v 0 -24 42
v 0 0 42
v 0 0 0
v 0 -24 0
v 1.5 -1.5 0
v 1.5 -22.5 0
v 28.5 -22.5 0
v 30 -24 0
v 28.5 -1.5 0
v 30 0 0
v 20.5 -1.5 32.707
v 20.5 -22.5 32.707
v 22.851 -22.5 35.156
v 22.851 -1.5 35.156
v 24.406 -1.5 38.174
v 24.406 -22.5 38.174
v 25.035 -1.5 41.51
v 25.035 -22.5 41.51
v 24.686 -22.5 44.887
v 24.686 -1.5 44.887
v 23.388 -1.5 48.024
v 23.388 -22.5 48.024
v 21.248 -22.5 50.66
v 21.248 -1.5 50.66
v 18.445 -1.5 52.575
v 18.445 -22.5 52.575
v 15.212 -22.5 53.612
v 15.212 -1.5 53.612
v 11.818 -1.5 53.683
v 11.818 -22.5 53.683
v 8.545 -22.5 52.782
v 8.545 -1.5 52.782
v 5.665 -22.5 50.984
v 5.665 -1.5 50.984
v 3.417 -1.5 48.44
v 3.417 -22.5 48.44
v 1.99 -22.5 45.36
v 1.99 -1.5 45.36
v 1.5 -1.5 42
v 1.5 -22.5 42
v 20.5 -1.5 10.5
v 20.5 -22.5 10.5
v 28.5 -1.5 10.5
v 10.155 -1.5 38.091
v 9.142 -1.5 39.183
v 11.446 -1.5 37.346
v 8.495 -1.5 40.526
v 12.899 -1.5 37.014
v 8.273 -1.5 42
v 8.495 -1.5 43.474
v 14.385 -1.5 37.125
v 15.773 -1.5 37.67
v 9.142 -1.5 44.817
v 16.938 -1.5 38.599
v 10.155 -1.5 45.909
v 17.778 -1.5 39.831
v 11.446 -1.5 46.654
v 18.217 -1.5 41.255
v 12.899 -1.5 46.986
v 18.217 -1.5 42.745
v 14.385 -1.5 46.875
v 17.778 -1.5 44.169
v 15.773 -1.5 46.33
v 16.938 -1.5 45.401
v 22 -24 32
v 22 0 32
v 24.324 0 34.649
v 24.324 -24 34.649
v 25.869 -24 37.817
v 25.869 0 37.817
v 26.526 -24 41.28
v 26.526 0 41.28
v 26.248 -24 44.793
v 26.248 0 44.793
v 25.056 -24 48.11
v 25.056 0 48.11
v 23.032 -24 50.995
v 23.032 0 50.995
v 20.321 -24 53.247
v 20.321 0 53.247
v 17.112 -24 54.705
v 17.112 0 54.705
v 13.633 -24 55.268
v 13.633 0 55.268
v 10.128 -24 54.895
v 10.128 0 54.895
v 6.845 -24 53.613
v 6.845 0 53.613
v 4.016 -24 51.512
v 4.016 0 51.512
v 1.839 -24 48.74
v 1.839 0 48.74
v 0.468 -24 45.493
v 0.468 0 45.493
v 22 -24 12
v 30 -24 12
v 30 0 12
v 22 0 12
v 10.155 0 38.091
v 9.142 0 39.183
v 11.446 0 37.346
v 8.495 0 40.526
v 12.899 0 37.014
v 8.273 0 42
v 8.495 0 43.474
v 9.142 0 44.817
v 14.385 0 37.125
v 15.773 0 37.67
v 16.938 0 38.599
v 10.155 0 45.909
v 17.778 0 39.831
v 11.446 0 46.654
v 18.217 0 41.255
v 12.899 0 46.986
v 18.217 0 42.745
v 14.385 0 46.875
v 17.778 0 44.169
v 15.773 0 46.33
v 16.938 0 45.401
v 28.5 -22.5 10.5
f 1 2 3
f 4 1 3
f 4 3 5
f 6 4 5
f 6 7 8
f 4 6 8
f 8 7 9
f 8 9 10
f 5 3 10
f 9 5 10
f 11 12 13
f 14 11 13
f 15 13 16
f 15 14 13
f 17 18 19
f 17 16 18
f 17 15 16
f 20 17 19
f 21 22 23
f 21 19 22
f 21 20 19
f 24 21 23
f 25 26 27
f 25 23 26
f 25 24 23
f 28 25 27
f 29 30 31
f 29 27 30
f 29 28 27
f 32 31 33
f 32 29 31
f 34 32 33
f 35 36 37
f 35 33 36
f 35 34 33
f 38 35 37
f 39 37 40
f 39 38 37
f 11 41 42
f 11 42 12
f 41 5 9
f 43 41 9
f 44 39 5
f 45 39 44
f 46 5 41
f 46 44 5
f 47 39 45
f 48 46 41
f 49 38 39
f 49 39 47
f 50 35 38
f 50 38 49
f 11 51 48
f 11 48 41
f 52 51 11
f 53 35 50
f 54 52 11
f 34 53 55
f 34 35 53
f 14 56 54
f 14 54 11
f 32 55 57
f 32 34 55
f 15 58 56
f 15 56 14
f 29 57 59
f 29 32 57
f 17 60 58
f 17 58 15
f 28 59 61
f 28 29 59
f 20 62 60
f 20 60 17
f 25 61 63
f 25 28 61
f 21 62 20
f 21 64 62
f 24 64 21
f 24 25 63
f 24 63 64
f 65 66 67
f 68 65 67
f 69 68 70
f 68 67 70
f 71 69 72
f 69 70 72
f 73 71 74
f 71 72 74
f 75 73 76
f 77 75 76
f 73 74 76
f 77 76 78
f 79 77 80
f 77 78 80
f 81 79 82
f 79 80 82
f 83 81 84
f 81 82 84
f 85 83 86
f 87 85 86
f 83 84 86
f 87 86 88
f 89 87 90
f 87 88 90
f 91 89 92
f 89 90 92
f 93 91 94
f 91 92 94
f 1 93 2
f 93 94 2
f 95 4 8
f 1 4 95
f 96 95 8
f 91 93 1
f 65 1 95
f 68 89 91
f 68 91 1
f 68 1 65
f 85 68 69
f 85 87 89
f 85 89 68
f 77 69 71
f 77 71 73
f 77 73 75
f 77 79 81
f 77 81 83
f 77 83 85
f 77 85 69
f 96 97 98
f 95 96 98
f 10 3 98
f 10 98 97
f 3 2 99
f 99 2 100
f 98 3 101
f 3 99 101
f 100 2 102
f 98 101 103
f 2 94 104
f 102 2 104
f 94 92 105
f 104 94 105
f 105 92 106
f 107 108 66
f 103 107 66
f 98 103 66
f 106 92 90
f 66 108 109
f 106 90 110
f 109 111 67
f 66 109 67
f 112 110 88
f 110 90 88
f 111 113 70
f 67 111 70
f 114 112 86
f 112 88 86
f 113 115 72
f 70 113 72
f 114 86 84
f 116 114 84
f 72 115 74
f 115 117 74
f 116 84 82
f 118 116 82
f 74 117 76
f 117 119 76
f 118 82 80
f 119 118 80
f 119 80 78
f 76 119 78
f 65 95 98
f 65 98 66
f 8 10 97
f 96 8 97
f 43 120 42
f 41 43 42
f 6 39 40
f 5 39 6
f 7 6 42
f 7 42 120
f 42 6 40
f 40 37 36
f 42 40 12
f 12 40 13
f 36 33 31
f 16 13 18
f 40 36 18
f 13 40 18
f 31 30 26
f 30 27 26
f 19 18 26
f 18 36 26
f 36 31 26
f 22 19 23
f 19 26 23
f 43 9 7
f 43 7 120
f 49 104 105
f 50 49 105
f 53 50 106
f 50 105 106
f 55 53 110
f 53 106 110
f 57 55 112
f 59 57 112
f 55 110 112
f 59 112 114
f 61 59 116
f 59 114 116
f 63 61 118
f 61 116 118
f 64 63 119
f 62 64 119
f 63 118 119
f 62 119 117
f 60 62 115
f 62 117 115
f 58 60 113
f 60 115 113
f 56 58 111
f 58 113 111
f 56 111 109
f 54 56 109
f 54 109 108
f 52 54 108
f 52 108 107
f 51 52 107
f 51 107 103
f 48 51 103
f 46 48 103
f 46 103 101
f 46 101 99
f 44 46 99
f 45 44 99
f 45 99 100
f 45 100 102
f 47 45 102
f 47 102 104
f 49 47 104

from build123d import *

# Parameters (mm, degrees)
F1_DEPTH = 24
F2_T     = -1.5
F3_R     = 5
F4_DEPTH = 5


with BuildPart() as f1:
    # F0 (on Front) → F1 (new body)
    with BuildSketch(Plane.XZ):
        with BuildLine():
            Line((0, 42), (0, 0))
            Line((0, 0), (30, 0))
            Line((30, 0), (30, 12))
            Line((30, 12), (22, 12))
            Line((22, 12), (22, 32))
            ThreePointArc((22, 32), (18.7650208971, 54.0830459736), (0, 42))
        make_face()
    extrude(amount=F1_DEPTH)

    # F2
    f2_openings = [f1.faces().sort_by_distance(p)[0] for p in [
        (15, -12, 0),
    ]]
    offset(amount=F2_T, openings=f2_openings, kind=Kind.INTERSECTION)

    # F3 (on face) → F4 (cut)
    with BuildSketch(Plane(origin=(0, 0, 0), x_dir=(-1, 0, 0), z_dir=(0, 1, 0))):
        with Locations((-13.2727272727, 42)):
            Circle(F3_R)
    extrude(amount=-F4_DEPTH, mode=Mode.SUBTRACT)


solid = f1.part
